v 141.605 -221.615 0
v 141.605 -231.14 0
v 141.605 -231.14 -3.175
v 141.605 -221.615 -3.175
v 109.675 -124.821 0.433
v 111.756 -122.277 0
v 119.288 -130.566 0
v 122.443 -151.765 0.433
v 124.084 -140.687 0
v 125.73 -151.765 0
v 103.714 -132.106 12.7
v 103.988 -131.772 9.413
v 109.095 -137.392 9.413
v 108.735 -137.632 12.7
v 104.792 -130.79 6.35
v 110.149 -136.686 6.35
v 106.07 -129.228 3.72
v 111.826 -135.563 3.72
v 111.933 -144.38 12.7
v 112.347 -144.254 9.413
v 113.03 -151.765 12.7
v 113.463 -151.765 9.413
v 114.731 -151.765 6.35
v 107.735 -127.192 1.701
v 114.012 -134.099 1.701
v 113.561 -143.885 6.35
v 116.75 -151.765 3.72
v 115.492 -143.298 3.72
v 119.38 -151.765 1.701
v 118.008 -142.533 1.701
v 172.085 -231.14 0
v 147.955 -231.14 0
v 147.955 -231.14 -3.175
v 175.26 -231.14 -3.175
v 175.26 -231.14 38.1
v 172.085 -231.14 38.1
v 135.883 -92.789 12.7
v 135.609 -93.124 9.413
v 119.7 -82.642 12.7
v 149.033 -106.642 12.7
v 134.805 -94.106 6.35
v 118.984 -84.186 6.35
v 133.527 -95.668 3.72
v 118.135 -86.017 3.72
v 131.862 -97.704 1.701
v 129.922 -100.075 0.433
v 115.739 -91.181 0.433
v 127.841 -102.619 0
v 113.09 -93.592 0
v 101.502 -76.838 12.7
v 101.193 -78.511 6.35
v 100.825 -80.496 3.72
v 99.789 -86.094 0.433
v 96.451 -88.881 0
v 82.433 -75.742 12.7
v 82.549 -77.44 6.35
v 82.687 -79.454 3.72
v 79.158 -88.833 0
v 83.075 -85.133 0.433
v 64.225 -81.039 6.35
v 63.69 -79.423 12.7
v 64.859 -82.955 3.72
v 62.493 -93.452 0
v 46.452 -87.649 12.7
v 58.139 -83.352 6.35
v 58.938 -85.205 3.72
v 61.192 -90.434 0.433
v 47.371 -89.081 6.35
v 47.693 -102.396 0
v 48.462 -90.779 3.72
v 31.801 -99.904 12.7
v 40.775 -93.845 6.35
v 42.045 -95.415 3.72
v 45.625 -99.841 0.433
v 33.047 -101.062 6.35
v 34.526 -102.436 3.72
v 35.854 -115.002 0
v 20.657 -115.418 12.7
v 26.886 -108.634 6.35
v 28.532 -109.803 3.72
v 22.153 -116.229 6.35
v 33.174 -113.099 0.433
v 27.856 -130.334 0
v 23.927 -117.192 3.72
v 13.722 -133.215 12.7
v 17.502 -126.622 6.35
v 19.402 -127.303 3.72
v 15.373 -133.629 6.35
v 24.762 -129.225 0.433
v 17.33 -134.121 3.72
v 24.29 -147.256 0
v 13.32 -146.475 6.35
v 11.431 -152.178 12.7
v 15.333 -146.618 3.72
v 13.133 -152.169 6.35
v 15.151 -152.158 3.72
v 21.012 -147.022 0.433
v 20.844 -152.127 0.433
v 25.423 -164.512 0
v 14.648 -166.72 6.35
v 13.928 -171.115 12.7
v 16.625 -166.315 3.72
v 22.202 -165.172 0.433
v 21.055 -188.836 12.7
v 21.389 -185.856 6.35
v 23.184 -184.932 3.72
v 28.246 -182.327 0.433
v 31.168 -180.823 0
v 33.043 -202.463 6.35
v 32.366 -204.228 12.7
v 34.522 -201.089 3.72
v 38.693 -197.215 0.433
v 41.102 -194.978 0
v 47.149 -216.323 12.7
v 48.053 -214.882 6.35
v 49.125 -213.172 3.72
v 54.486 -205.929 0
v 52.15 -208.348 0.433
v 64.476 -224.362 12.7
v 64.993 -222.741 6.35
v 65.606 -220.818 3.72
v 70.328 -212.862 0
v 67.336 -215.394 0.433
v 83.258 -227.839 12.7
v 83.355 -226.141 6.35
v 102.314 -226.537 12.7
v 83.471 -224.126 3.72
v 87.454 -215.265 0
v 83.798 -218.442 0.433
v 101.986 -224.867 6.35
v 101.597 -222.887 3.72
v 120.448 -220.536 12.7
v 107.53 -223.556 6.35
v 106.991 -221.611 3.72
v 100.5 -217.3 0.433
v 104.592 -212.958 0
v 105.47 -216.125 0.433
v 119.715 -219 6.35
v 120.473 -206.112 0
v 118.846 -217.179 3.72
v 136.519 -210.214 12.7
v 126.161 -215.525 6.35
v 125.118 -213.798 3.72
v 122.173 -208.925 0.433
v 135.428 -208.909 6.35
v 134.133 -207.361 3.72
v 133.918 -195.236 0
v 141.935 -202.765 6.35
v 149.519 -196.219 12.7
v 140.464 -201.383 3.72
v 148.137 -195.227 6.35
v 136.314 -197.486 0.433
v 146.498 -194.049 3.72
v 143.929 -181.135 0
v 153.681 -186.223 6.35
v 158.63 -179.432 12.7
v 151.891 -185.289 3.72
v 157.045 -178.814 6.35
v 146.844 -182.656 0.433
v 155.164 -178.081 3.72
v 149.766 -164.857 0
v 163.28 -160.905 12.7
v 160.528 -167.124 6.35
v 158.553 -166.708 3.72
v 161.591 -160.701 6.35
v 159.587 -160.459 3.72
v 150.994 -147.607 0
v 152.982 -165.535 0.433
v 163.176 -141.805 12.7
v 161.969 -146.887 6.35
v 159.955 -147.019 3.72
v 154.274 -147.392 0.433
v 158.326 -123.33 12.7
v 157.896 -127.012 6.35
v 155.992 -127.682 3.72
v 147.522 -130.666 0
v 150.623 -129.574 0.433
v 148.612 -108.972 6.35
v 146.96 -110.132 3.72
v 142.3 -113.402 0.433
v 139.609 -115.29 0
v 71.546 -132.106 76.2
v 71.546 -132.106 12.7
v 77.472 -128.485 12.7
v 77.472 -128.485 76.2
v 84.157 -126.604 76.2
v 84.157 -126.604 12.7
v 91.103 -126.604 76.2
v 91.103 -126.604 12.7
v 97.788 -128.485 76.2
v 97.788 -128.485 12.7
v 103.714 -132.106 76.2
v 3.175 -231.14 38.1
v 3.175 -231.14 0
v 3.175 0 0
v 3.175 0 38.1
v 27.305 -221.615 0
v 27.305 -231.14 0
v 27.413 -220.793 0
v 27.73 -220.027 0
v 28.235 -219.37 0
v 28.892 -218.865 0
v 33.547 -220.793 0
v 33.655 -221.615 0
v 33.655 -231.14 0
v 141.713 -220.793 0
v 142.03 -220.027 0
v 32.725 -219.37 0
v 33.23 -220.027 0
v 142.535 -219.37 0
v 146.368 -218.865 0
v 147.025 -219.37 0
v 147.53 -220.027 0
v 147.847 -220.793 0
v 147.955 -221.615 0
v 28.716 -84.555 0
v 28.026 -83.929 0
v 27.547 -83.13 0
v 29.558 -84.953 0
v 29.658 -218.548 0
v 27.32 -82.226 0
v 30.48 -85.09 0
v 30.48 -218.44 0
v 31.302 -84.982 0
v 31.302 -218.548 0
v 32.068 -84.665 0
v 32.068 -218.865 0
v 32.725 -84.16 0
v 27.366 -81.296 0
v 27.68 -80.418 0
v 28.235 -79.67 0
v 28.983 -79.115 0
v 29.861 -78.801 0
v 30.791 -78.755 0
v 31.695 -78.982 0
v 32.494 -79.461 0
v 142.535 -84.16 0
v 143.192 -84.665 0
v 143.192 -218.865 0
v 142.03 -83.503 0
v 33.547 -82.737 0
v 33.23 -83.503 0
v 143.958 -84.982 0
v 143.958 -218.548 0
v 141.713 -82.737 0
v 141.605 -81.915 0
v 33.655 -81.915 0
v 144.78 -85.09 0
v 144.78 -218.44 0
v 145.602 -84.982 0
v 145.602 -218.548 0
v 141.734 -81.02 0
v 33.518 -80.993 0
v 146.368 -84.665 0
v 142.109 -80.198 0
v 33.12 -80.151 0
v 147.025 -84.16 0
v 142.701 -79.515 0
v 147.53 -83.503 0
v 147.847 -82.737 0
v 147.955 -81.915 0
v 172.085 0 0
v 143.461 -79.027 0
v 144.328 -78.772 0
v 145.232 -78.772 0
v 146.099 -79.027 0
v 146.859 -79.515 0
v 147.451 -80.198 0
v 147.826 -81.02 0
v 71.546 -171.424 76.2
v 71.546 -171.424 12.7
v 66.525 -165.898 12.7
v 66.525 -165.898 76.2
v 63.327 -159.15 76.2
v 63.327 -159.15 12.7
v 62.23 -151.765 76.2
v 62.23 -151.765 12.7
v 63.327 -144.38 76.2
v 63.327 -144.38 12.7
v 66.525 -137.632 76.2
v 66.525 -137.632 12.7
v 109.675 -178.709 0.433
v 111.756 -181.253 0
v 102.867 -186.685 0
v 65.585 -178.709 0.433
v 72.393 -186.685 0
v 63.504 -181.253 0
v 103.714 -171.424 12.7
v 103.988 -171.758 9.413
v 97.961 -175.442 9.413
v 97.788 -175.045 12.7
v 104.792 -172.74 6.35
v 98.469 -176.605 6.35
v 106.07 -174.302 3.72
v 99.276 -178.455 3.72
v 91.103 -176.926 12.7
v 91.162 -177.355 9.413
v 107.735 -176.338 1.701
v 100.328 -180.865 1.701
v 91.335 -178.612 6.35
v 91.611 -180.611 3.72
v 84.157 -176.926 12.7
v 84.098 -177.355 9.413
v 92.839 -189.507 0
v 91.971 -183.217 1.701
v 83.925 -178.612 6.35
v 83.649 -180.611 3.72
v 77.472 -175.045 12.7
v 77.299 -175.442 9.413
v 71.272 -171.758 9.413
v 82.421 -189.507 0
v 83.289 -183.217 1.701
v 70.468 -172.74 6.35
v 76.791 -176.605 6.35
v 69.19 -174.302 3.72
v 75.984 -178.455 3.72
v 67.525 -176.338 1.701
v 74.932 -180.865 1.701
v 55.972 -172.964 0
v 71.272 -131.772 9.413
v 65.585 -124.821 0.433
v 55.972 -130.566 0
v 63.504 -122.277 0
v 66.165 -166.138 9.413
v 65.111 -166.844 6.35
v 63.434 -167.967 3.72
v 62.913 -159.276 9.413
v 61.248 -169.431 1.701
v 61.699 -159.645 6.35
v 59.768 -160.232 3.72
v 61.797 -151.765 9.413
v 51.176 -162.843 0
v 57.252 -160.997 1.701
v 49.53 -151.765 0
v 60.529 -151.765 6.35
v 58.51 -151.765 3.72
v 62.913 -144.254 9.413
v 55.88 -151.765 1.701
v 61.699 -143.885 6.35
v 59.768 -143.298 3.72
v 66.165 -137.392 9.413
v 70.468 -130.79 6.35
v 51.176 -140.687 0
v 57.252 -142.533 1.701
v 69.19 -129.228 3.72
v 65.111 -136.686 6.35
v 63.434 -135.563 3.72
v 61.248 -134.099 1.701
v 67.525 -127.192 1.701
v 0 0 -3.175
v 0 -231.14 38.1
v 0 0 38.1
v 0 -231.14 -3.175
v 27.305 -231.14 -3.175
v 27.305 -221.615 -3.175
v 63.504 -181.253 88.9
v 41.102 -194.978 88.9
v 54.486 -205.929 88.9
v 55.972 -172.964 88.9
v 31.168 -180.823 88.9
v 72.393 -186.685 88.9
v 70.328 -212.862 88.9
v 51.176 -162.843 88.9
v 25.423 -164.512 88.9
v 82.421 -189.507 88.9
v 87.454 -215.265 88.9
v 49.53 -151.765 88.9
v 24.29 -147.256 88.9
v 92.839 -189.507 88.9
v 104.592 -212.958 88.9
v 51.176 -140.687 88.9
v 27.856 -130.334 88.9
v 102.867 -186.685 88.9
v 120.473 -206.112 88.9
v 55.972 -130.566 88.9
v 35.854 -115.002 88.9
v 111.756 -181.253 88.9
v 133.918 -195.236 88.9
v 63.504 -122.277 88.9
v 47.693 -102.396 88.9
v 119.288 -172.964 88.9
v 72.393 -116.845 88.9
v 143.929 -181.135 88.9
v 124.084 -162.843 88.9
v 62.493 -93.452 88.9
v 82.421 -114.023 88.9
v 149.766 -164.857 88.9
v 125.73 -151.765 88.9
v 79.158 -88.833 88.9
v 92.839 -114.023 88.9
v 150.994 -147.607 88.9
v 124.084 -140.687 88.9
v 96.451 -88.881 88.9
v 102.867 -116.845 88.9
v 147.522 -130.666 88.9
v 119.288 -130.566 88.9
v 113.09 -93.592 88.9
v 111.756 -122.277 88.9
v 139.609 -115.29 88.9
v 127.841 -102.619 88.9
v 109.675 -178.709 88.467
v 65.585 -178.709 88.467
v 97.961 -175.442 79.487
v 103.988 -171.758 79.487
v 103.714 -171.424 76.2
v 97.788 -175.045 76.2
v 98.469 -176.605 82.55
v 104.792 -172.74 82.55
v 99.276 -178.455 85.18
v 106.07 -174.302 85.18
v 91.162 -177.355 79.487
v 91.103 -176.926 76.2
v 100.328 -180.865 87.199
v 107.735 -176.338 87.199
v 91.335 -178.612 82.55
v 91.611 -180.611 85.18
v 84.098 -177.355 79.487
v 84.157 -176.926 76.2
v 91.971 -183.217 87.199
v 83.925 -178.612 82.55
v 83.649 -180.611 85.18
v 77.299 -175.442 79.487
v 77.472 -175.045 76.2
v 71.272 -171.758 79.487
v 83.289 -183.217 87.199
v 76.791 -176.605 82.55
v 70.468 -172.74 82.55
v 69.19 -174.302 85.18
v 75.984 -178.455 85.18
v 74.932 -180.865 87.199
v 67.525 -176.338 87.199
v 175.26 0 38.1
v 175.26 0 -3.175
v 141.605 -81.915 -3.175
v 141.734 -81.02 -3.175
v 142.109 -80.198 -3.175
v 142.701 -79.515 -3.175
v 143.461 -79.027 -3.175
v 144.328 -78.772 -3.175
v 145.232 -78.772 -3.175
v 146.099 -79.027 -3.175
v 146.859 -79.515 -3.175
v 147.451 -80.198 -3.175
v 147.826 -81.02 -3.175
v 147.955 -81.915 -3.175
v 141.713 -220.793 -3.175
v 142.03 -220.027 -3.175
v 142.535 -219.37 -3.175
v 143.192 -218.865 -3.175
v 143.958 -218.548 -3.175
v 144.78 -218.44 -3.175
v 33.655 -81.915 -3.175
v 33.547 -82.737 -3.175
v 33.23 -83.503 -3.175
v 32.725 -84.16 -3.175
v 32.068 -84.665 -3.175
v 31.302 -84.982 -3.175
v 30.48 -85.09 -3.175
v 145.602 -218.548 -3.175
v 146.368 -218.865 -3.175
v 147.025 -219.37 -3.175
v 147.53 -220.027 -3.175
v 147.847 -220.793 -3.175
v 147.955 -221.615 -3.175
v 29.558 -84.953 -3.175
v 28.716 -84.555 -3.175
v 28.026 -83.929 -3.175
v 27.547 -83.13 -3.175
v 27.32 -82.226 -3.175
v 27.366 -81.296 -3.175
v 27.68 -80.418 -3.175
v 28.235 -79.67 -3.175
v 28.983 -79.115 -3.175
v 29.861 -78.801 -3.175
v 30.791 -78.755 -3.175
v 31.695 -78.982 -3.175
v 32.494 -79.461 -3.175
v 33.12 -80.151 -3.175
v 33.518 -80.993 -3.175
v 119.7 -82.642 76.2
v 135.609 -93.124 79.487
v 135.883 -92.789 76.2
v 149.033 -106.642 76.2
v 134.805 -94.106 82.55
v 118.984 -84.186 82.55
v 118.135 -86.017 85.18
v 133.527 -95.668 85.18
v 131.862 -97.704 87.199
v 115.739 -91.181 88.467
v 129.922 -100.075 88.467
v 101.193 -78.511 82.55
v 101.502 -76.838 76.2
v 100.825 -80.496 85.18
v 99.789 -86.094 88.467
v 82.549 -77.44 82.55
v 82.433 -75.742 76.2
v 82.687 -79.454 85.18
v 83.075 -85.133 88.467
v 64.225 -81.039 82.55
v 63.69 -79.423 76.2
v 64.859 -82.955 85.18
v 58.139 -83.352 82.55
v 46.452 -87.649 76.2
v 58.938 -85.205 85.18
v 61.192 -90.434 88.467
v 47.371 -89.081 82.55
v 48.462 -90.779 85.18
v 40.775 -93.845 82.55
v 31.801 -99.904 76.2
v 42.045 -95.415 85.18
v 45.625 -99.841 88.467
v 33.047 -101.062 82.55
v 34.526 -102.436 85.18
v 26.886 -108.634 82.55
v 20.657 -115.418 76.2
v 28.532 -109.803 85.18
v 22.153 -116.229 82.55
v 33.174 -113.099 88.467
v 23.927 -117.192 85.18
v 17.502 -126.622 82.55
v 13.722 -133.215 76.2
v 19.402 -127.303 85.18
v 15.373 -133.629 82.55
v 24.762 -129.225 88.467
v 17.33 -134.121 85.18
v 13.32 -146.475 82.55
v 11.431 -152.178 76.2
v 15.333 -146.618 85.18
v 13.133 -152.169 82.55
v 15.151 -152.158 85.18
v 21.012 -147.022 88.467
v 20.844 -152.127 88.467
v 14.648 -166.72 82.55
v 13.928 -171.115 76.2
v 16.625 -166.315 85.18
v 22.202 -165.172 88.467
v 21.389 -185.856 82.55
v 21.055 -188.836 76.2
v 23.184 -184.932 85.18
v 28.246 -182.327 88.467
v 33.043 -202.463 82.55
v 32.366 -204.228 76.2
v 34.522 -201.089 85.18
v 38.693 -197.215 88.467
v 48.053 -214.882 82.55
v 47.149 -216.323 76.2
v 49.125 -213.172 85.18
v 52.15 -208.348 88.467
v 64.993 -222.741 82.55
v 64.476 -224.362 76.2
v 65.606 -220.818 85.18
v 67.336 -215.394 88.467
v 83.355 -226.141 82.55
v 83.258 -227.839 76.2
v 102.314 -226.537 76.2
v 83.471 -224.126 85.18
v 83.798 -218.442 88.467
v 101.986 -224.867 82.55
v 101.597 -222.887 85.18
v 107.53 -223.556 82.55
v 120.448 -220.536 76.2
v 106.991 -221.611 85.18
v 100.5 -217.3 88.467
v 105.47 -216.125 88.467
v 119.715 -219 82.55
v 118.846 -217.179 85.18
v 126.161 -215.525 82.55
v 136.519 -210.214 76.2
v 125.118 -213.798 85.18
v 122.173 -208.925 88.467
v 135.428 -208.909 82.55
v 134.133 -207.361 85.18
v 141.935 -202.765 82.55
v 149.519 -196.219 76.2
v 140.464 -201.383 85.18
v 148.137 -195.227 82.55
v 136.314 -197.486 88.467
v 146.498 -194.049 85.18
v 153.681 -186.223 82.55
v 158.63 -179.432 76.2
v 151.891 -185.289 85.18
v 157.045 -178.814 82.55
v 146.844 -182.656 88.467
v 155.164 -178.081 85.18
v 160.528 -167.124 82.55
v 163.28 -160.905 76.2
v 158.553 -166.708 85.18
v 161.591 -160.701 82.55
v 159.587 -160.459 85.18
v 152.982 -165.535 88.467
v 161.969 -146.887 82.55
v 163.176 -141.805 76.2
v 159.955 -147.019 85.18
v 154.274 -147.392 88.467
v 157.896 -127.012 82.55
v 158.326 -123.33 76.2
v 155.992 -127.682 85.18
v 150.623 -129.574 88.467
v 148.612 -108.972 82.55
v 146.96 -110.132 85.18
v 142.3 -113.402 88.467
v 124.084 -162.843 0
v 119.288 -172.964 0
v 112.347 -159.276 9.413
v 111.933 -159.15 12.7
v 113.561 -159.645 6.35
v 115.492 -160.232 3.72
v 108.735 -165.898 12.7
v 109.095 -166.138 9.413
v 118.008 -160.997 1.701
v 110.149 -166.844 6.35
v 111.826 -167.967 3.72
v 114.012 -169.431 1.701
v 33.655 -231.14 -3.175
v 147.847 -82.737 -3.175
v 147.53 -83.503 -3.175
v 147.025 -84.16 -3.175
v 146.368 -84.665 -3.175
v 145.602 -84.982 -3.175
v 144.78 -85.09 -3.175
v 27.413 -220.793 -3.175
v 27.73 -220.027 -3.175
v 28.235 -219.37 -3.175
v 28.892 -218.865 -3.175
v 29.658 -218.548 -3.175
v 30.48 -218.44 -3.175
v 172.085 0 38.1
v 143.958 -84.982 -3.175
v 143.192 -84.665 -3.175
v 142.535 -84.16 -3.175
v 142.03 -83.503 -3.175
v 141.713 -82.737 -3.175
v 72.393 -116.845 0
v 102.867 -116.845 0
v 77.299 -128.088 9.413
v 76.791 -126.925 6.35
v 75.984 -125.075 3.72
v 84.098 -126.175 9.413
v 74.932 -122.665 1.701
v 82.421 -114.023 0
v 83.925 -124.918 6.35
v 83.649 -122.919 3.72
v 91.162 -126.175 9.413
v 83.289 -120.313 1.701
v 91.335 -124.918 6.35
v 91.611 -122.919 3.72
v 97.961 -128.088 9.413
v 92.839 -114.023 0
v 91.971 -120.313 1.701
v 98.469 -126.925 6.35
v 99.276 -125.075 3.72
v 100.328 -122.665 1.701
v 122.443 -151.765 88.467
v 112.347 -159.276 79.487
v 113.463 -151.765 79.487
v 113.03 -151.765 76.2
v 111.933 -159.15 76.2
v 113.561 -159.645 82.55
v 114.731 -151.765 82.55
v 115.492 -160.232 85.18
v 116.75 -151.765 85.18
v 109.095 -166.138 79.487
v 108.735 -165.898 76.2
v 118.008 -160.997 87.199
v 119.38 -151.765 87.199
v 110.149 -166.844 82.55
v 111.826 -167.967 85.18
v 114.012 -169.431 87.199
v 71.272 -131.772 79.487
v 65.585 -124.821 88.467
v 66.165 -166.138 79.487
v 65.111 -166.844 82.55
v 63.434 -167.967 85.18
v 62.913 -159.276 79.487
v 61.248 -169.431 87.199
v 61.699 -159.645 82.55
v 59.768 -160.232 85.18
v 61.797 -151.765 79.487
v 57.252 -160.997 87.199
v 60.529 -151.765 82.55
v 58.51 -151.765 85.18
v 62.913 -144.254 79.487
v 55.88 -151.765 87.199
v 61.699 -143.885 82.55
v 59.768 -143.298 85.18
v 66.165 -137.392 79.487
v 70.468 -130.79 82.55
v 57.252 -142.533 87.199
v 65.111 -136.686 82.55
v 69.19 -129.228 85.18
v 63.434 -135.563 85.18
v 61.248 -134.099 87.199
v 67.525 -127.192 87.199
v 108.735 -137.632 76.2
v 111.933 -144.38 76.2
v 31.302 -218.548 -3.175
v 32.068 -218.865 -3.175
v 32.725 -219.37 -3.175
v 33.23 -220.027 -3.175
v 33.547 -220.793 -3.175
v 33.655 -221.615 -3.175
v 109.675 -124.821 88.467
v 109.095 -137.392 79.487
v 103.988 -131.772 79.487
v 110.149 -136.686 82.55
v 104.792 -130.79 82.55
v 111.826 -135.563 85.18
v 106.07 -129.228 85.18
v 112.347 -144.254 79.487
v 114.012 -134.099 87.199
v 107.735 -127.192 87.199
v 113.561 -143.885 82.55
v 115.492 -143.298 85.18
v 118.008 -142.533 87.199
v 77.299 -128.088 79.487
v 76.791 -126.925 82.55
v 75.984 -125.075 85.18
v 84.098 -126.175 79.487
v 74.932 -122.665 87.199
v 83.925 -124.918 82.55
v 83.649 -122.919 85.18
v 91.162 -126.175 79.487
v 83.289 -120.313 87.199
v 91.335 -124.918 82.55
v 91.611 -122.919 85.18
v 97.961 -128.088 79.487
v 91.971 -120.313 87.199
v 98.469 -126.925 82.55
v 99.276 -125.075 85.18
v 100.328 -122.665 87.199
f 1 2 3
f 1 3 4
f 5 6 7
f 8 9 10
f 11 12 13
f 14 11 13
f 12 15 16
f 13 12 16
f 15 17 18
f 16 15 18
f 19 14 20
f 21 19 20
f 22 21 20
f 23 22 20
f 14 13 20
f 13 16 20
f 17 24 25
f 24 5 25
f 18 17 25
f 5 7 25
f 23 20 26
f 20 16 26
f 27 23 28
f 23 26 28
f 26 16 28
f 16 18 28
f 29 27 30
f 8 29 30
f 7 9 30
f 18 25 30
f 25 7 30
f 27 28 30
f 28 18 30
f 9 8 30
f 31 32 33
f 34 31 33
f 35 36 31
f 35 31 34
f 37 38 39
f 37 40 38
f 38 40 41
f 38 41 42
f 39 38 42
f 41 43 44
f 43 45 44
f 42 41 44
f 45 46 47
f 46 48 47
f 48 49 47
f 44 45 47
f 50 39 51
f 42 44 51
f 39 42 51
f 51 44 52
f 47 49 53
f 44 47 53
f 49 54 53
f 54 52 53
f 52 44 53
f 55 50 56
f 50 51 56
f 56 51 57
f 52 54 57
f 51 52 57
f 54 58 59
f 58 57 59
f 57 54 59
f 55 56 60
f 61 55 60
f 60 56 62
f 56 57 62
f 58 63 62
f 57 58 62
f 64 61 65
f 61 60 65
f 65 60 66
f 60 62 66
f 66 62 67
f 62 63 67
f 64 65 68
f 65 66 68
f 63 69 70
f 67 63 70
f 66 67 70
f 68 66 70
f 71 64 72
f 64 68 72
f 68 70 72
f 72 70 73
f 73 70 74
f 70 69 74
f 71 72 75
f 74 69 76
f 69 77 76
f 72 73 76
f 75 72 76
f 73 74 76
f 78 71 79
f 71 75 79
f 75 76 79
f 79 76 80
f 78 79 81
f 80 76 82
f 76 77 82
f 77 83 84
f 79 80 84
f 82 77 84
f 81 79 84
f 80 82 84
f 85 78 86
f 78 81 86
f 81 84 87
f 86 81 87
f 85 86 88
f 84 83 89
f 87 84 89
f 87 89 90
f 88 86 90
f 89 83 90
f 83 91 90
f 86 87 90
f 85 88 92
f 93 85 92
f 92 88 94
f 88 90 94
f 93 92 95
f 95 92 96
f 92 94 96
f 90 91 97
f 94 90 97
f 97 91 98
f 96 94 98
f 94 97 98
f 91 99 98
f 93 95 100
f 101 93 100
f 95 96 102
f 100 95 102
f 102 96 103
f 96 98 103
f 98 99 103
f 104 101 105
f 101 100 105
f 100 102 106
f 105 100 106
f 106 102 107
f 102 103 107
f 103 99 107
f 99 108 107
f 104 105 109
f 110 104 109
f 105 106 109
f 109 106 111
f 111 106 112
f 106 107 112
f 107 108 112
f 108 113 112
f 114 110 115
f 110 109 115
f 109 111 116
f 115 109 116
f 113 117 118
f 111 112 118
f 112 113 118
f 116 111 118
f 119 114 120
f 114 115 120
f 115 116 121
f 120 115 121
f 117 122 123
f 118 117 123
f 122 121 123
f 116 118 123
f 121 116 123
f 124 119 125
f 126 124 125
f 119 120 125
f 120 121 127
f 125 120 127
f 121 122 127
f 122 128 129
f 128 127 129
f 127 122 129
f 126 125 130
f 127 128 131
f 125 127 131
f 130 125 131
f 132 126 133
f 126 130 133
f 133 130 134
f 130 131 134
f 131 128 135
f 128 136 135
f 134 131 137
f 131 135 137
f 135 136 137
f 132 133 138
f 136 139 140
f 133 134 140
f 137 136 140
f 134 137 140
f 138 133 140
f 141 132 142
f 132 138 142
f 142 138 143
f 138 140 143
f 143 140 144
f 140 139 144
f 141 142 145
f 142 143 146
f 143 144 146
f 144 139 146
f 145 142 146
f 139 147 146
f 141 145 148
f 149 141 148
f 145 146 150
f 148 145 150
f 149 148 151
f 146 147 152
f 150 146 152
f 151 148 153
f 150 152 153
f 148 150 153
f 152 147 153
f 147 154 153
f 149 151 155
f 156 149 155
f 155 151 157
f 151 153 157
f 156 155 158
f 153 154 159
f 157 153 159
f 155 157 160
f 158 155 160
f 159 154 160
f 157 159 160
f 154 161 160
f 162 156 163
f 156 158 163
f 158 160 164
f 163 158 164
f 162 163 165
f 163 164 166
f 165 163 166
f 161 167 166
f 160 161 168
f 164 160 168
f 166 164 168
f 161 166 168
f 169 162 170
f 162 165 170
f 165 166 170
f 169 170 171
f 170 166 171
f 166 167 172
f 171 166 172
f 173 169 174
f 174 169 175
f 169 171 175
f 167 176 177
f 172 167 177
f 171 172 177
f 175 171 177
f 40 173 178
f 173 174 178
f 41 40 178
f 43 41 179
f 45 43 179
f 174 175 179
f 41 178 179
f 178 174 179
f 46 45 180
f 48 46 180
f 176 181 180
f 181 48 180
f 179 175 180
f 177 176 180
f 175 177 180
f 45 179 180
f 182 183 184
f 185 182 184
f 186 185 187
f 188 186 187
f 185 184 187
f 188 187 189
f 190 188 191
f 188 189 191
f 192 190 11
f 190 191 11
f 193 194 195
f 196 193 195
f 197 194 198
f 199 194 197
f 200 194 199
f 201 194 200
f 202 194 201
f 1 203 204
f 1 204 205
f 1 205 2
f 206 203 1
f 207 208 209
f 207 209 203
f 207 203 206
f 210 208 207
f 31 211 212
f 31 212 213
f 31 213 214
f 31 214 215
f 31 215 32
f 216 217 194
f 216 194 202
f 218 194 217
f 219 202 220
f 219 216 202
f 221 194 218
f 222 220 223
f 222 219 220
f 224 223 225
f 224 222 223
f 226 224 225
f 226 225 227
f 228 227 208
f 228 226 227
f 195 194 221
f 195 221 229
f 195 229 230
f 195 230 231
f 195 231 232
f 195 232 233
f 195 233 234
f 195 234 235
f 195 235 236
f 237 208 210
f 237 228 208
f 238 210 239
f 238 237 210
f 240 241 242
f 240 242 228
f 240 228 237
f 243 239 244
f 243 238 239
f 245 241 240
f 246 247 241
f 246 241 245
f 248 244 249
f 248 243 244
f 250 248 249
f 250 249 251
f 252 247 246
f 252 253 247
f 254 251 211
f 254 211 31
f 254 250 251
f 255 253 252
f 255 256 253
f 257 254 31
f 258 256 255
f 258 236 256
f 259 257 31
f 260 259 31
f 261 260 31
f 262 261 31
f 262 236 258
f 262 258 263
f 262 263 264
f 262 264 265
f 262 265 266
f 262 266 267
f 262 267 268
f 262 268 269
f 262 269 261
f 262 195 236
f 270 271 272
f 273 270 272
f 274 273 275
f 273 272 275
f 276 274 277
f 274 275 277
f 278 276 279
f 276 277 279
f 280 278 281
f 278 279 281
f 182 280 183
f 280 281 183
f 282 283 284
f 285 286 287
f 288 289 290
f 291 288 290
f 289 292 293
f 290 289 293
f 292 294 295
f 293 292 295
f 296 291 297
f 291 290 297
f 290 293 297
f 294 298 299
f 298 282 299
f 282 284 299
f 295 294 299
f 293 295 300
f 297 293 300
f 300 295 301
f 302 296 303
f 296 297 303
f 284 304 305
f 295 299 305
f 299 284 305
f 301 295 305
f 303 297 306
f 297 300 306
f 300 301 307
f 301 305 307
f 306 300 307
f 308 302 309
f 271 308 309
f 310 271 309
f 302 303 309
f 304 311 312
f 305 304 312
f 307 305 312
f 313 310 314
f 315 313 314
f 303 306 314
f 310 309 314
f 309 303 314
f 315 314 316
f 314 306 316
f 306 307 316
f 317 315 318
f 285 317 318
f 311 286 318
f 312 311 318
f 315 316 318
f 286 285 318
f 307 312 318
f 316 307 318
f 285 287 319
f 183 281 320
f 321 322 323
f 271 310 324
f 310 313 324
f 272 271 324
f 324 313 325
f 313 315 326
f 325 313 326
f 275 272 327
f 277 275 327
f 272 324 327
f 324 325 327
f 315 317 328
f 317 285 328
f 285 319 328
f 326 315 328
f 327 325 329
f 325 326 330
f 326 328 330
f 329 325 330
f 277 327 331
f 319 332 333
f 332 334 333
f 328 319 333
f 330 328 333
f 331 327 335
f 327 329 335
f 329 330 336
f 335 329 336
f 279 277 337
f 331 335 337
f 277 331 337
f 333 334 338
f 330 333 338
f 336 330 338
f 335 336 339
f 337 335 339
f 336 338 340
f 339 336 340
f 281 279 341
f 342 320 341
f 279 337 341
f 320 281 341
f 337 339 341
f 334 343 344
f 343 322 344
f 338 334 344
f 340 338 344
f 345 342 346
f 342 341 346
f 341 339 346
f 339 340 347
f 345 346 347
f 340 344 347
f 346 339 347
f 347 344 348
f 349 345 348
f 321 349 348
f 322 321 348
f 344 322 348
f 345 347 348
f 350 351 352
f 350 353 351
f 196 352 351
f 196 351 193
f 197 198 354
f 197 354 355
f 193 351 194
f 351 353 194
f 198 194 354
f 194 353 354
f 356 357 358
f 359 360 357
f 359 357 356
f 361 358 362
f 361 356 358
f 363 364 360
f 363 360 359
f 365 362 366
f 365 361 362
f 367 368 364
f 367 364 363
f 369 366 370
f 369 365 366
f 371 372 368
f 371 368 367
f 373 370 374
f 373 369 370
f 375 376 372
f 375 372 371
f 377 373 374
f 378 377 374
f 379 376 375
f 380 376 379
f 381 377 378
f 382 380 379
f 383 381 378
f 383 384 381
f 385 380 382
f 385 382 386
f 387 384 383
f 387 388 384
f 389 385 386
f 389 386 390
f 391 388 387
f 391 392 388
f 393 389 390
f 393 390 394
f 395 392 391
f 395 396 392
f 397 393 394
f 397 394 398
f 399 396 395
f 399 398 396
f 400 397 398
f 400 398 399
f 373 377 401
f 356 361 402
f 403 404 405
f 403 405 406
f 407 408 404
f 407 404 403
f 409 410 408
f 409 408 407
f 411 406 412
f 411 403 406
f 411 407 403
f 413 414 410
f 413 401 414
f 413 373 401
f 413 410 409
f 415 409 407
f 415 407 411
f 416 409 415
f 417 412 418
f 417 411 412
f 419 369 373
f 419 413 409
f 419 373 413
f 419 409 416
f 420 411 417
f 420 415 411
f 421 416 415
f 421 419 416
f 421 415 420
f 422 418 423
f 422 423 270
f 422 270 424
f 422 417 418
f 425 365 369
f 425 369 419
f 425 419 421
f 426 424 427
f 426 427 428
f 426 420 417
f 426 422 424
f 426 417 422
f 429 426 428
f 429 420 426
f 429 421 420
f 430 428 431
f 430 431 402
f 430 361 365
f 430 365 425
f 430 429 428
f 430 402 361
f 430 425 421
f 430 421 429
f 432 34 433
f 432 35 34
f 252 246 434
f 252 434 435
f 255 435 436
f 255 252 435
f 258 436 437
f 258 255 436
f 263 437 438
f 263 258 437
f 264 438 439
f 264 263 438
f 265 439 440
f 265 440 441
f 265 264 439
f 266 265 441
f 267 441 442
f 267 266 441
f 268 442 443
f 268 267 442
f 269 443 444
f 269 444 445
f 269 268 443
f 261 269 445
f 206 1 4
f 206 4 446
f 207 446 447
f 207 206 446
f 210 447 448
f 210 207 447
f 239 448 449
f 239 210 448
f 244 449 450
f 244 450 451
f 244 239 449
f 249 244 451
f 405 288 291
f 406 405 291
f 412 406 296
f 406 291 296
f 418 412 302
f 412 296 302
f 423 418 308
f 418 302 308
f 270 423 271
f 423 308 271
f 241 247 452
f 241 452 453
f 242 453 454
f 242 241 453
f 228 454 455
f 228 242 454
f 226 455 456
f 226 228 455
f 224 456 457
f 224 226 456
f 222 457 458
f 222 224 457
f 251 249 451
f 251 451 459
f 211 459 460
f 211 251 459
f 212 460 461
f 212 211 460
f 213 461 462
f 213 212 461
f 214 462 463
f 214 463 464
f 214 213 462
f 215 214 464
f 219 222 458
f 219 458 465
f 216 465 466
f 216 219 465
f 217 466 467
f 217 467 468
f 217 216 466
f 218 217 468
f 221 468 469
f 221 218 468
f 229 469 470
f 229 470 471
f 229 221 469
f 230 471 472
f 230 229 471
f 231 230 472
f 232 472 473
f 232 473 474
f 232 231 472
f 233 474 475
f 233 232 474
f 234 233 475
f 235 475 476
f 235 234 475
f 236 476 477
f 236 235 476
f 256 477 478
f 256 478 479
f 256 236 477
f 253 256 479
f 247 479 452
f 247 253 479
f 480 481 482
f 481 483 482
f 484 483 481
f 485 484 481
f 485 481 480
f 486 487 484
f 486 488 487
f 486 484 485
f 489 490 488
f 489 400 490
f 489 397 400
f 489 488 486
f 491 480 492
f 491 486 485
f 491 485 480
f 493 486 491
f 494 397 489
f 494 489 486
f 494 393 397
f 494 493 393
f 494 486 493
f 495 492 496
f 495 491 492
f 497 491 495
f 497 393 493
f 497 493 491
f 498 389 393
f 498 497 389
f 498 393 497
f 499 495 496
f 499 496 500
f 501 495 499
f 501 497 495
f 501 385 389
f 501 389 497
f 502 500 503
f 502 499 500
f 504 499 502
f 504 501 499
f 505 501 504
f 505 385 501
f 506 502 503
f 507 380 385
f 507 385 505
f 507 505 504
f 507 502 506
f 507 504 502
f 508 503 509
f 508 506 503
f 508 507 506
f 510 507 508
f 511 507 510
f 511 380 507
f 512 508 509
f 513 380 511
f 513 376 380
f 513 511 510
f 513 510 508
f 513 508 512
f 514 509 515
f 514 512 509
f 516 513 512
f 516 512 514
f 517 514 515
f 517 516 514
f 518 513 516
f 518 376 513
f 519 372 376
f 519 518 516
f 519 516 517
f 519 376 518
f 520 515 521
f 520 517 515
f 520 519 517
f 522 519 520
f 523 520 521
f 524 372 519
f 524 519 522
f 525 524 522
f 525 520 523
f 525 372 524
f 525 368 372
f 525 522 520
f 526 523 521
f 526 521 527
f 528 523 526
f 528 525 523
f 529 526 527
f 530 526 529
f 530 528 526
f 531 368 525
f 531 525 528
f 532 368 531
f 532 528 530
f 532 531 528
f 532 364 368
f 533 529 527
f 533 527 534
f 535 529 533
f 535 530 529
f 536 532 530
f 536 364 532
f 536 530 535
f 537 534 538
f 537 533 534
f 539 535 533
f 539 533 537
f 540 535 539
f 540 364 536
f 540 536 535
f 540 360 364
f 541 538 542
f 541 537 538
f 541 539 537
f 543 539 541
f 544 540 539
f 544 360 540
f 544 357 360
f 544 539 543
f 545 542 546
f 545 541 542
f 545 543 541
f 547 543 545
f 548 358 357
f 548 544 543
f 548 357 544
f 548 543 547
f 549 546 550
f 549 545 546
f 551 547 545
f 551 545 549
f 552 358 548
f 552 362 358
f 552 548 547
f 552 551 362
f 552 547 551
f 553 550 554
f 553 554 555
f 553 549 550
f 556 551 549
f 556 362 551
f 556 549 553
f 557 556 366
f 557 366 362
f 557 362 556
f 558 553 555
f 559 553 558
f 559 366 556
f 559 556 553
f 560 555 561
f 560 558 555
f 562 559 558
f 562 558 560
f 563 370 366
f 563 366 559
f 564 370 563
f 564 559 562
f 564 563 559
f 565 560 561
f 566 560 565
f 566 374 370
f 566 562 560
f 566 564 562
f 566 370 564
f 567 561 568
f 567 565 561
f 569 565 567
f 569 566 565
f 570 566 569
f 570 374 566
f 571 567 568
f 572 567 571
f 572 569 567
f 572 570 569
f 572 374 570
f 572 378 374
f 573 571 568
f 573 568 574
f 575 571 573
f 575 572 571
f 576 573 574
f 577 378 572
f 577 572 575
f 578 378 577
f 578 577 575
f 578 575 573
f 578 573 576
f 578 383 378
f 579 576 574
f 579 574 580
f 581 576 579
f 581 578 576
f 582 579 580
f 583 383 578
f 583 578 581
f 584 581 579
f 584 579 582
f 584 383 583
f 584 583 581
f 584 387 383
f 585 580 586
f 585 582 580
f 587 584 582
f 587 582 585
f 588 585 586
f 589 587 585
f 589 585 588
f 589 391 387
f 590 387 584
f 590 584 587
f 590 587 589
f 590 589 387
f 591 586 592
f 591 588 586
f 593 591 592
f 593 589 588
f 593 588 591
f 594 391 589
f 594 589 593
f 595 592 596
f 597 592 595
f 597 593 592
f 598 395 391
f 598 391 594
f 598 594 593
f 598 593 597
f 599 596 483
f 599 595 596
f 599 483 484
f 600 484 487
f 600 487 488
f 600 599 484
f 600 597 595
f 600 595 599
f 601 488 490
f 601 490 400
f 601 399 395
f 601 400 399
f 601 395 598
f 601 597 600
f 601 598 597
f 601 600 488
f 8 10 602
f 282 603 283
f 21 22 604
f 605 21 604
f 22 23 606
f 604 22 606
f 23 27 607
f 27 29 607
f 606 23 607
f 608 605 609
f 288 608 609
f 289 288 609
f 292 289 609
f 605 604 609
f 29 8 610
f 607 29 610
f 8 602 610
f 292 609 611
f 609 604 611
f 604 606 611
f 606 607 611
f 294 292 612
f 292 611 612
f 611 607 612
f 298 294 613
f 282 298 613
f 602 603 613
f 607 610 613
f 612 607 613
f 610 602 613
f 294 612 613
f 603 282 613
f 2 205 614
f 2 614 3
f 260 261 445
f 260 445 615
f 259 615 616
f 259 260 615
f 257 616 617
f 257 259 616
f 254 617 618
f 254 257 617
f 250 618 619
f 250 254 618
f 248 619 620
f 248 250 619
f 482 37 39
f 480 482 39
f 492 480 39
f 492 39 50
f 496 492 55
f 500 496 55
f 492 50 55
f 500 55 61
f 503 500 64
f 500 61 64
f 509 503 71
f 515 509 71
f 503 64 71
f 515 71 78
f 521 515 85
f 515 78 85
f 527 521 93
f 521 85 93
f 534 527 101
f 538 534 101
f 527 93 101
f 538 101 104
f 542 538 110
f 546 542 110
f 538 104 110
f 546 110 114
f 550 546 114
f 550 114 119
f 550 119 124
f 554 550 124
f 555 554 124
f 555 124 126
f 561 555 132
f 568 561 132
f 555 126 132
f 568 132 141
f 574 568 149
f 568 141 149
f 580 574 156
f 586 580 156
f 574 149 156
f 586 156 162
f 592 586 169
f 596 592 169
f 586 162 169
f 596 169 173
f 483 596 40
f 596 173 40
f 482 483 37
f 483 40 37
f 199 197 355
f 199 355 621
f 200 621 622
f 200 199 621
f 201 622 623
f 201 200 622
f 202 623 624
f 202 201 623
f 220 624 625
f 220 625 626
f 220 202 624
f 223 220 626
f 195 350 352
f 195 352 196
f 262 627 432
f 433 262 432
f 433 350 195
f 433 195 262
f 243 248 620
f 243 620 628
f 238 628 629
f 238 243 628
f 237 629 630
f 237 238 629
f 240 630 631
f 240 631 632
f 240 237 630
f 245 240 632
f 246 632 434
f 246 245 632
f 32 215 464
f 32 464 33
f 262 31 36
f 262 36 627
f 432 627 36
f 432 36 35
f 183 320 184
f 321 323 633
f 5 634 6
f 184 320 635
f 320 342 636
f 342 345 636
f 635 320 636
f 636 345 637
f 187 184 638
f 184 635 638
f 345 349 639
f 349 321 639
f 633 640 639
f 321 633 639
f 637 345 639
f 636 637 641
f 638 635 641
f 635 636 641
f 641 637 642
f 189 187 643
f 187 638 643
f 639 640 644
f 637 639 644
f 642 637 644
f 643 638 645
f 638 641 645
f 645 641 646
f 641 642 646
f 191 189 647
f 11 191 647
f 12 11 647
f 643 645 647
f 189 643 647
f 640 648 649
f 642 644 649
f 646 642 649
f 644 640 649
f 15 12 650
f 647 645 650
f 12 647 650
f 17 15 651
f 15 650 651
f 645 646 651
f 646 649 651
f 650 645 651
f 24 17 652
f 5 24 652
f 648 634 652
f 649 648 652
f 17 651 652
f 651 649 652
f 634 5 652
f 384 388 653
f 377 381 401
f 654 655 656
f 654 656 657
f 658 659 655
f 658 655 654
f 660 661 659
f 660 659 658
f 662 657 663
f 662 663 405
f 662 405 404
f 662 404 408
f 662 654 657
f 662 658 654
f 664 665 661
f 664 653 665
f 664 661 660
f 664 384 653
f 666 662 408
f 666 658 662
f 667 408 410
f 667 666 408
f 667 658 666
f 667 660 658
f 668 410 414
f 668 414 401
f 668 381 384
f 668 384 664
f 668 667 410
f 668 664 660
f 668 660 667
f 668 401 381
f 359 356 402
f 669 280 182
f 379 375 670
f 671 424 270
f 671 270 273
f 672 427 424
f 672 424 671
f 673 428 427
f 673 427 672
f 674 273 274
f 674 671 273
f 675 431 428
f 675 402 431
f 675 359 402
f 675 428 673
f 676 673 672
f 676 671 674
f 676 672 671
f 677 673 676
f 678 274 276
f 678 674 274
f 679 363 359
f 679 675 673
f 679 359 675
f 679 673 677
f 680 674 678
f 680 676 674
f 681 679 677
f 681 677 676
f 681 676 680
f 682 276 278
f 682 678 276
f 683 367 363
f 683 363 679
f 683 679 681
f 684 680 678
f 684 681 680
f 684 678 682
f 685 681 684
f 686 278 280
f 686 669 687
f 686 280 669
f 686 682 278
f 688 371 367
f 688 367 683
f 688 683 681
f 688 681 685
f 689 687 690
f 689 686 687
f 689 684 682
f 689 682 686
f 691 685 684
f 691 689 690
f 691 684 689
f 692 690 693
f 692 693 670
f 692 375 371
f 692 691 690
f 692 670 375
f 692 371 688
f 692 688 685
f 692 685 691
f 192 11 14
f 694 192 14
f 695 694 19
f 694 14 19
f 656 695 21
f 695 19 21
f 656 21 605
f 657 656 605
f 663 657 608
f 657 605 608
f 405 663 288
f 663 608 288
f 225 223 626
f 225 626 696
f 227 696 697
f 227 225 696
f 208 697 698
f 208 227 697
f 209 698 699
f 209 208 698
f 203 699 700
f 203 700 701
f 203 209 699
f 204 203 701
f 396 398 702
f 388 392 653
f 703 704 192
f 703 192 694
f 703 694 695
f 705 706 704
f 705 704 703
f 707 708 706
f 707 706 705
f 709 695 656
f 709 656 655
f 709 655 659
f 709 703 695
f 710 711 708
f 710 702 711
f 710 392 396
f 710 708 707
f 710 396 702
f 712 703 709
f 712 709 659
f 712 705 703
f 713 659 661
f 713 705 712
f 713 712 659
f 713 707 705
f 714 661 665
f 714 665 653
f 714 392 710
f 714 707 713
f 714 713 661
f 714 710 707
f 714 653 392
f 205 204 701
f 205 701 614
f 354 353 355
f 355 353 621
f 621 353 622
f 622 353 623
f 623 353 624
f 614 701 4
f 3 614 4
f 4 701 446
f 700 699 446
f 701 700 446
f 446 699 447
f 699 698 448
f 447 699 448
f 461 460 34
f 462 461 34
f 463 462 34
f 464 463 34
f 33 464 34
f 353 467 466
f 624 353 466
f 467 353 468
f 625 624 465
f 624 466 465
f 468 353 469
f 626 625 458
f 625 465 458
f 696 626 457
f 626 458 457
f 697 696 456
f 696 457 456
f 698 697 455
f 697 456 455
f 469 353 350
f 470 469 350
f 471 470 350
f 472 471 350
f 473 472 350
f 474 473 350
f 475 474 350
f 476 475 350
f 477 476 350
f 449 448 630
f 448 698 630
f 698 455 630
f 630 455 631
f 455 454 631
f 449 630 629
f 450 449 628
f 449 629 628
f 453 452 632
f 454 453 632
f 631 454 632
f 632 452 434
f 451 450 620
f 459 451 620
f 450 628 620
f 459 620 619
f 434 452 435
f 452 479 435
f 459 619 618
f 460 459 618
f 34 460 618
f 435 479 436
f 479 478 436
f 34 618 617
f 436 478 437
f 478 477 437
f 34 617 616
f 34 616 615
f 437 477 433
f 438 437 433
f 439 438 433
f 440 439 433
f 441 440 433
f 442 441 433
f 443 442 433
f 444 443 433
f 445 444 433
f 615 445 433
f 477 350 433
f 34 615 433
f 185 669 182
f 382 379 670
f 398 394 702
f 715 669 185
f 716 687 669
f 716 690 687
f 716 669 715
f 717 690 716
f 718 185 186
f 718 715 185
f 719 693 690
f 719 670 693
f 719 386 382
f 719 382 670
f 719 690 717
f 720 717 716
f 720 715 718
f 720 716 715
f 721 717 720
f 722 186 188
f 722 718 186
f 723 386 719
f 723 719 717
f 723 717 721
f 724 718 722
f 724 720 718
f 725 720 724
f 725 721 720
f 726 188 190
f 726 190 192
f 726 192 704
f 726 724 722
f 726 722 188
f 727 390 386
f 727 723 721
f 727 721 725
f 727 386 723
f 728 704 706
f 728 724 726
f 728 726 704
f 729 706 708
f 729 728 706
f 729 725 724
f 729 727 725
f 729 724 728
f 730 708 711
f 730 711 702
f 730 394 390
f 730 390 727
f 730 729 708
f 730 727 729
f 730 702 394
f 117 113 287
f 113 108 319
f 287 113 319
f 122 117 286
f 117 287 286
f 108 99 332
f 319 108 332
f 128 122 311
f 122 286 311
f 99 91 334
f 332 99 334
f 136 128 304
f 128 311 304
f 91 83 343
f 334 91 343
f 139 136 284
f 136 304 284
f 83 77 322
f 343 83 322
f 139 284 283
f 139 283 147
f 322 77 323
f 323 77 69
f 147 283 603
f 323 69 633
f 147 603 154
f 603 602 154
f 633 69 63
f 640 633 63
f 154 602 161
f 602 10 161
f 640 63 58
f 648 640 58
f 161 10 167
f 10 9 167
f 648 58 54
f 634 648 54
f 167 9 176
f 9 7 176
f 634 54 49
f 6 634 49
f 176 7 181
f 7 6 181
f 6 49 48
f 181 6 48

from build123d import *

# Parameters (mm, degrees)
F0_W     = 3.175
F0_H     = 231.14
F1_DEPTH = 3.175
F2_DEPTH = 38.1
F4_DEPTH = 88.9
F5_R     = 12.7


with BuildPart() as f1:
    # F0 (on Top) → F1 (new body)
    with BuildSketch(Plane.XY):
        with BuildLine():
            Line((172.085, 0), (3.175, 0))
            Line((3.175, 0), (3.175, -231.14))
            Line((3.175, -231.14), (27.305, -231.14))
            Line((27.305, -231.14), (27.305, -221.615))
            ThreePointArc((27.305, -221.615), (28.2349359697, -219.3699359697), (30.48, -218.44))
            Line((30.48, -218.44), (30.48, -85.09))
            ThreePointArc((30.48, -85.09), (28.2349359697, -79.6699359697), (33.655, -81.915))
            Line((33.655, -81.915), (87.63, -81.915))
            Line((87.63, -81.915), (141.605, -81.915))
            ThreePointArc((141.605, -81.915), (144.78, -78.74), (147.955, -81.915))
            ThreePointArc((147.955, -81.915), (147.0250640303, -84.1600640303), (144.78, -85.09))
            Line((144.78, -85.09), (144.78, -218.44))
            ThreePointArc((144.78, -218.44), (147.0250640303, -219.3699359697), (147.955, -221.615))
            Line((147.955, -221.615), (147.955, -231.14))
            Line((147.955, -231.14), (172.085, -231.14))
            Line((172.085, -231.14), (172.085, 0))
        make_face()
        with BuildLine():
            Line((30.48, -85.09), (30.48, -218.44))
            ThreePointArc((30.48, -218.44), (32.7250640303, -219.3699359697), (33.655, -221.615))
            Line((33.655, -221.615), (87.63, -221.615))
            Line((87.63, -221.615), (87.63, -81.915))
            Line((87.63, -81.915), (33.655, -81.915))
            ThreePointArc((33.655, -81.915), (32.7250640303, -84.1600640303), (30.48, -85.09))
        make_face()
        with BuildLine():
            ThreePointArc((141.605, -221.615), (142.5349359697, -219.3699359697), (144.78, -218.44))
            Line((144.78, -218.44), (144.78, -85.09))
            ThreePointArc((144.78, -85.09), (142.5349359697, -84.1600640303), (141.605, -81.915))
            Line((141.605, -81.915), (87.63, -81.915))
            Line((87.63, -81.915), (87.63, -221.615))
            Line((87.63, -221.615), (141.605, -221.615))
        make_face()
        with Locations((1.5875, -115.57)):
            Rectangle(F0_W, F0_H)
        with Locations((173.6725, -115.57)):
            Rectangle(F0_W, F0_H)
        Polygon((87.63, -221.615), (33.655, -221.615), (33.655, -231.14), (141.605, -231.14), (141.605, -221.615), align=None)
    extrude(amount=-F1_DEPTH)

    # F0 (on Top) → F2 (join)
    with BuildSketch(Plane.XY):
        with Locations((1.5875, -115.57)):
            Rectangle(F0_W, F0_H)
        with Locations((173.6725, -115.57)):
            Rectangle(F0_W, F0_H)
    extrude(amount=F2_DEPTH)


with BuildPart() as f4:
    # F3 (on face) → F4 (new body)
    with BuildSketch(Plane.XY):
        with BuildLine():
            Line((71.5457601275, -132.1064846002), (39.3772803824, -92.7894538007))
            ThreePointArc((39.3772803824, -92.7894538007), (11.43, -151.765), (39.3772803824, -210.7405461993))
            Line((39.3772803824, -210.7405461993), (71.5457601275, -171.4235153998))
            ThreePointArc((71.5457601275, -171.4235153998), (62.23, -151.765), (71.5457601275, -132.1064846002))
        make_face()
        with BuildLine():
            ThreePointArc((135.8827196176, -92.7894538007), (87.63, -75.565), (39.3772803824, -92.7894538007))
            Line((39.3772803824, -92.7894538007), (71.5457601275, -132.1064846002))
            ThreePointArc((71.5457601275, -132.1064846002), (87.63, -126.365), (103.7142398725, -132.1064846002))
            Line((103.7142398725, -132.1064846002), (135.8827196176, -92.7894538007))
        make_face()
        with BuildLine():
            ThreePointArc((163.83, -151.765), (156.489629809, -119.1338586996), (135.8827196176, -92.7894538007))
            Line((135.8827196176, -92.7894538007), (103.7142398725, -132.1064846002))
            ThreePointArc((103.7142398725, -132.1064846002), (110.5832099363, -140.8879528999), (113.03, -151.765))
            ThreePointArc((113.03, -151.765), (110.5832099363, -162.6420471001), (103.7142398725, -171.4235153998))
            Line((103.7142398725, -171.4235153998), (135.8827196176, -210.7405461993))
            ThreePointArc((135.8827196176, -210.7405461993), (156.489629809, -184.3961413004), (163.83, -151.765))
        make_face()
        with BuildLine():
            Line((71.5457601275, -171.4235153998), (39.3772803824, -210.7405461993))
            ThreePointArc((39.3772803824, -210.7405461993), (87.63, -227.965), (135.8827196176, -210.7405461993))
            Line((135.8827196176, -210.7405461993), (103.7142398725, -171.4235153998))
            ThreePointArc((103.7142398725, -171.4235153998), (87.63, -177.165), (71.5457601275, -171.4235153998))
        make_face()
    extrude(amount=F4_DEPTH)

    # F5
    f5_edges = [f4.edges().sort_by_distance(p)[0] for p in [
        (135.88272, -92.789454, 88.9),
        (71.54576, -132.106485, 88.9),
        (135.88272, -92.789454, 0),
        (71.54576, -132.106485, 0),
    ]]
    fillet(f5_edges, radius=F5_R)


solid = Compound([f1.part, f4.part])
